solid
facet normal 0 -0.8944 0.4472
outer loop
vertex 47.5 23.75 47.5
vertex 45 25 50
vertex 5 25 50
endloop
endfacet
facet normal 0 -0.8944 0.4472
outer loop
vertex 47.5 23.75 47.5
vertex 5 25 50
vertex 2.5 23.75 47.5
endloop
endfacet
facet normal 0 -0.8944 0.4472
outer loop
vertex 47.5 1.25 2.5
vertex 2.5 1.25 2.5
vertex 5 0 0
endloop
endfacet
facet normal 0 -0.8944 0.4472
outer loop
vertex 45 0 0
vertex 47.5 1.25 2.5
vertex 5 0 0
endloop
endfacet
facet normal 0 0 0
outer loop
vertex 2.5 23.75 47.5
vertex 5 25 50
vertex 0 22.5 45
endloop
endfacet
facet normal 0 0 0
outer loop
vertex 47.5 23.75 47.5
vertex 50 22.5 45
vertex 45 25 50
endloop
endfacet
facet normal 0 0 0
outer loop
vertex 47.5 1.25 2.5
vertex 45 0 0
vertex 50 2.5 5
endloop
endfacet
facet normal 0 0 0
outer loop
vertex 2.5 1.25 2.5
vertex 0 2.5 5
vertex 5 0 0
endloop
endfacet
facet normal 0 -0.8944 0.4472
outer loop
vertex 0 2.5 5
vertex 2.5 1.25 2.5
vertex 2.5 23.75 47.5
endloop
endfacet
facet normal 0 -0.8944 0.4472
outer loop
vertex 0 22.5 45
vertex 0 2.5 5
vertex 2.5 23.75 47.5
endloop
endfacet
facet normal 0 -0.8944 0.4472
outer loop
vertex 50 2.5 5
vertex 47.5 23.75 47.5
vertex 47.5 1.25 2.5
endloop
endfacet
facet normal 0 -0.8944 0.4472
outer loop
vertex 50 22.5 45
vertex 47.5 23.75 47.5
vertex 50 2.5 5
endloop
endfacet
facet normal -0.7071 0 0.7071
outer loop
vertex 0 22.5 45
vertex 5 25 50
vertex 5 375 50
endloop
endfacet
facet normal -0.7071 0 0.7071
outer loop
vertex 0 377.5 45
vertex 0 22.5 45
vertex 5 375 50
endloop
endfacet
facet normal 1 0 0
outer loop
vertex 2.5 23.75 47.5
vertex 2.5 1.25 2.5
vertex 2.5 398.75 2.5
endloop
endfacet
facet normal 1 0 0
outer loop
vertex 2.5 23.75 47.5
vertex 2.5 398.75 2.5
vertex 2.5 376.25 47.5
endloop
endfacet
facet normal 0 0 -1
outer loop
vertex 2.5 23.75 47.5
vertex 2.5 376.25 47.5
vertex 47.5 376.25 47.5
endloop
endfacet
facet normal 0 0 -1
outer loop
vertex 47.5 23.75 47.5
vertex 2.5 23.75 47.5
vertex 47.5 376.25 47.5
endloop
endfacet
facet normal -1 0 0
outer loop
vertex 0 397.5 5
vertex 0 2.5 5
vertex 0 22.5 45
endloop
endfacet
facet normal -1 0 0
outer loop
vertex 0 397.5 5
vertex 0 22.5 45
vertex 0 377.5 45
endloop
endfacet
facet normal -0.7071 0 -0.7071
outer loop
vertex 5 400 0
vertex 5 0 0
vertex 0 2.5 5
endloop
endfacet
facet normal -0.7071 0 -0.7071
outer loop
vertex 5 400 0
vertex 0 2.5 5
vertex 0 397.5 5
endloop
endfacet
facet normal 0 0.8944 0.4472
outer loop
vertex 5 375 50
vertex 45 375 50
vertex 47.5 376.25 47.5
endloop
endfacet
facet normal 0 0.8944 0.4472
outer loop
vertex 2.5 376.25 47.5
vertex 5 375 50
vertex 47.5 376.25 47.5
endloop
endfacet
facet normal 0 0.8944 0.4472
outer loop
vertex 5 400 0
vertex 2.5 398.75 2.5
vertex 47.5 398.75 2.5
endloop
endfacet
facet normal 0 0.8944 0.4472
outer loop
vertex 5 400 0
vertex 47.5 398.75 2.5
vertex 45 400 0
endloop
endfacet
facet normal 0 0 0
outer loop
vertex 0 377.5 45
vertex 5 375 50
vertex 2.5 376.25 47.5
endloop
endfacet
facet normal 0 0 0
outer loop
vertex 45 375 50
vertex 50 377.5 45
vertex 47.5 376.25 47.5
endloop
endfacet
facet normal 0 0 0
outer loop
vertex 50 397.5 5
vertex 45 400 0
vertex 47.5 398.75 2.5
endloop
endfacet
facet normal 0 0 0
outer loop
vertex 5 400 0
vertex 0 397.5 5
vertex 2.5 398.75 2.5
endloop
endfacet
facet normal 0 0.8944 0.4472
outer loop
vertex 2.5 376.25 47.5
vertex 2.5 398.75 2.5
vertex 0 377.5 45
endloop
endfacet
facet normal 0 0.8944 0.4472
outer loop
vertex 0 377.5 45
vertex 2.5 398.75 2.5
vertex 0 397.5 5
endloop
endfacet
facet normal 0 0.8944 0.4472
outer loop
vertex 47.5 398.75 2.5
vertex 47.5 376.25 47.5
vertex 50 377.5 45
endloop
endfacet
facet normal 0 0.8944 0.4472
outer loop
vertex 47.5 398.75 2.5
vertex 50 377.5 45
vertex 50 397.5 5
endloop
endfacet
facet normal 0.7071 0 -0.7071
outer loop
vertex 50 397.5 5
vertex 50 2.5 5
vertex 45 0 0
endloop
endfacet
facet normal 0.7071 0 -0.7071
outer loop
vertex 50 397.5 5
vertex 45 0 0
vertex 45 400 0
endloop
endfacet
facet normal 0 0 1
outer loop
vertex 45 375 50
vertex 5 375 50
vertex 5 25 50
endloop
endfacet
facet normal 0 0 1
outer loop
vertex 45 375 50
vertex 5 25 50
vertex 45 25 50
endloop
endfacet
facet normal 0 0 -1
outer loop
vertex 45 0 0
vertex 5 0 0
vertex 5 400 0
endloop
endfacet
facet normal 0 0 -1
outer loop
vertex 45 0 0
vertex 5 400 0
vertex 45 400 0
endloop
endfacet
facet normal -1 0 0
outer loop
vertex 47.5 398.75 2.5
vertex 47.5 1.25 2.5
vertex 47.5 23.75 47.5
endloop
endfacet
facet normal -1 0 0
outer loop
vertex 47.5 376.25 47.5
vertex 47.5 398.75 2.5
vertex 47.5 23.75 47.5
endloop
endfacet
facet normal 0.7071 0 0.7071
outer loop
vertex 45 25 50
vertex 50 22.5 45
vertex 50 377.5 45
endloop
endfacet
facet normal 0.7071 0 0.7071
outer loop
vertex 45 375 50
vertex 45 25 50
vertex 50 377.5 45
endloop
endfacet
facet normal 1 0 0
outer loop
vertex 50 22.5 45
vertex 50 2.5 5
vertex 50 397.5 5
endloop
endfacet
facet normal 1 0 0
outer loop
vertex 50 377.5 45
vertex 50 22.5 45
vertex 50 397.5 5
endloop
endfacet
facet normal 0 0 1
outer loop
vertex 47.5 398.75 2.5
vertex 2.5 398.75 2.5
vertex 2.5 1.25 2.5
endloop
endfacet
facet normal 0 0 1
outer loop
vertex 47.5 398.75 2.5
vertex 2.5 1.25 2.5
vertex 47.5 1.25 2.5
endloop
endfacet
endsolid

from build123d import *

# Parameters (mm, degrees)
SKETCH1_W           = 50
SKETCH1_H           = 400
BOSS_EXTRUDE2_DEPTH = 50
SKETCH2_W           = 45
SKETCH2_H           = 45
CUT_EXTRUDE1_DEPTH  = 407.201920232
CUT_EXTRUDE2_DEPTH  = 407.201920232
CHAMFER1_SIZE       = 5


with BuildPart() as part:
    # Sketch1 → Boss-Extrude2 (new body)
    with BuildSketch(Plane.XY):
        with Locations((25, 200)):
            Rectangle(SKETCH1_W, SKETCH1_H)
    extrude(amount=BOSS_EXTRUDE2_DEPTH)

    # Sketch2 → Cut-Extrude1 (cut, through all)
    with BuildSketch(Plane.XZ):
        with Locations((25, 25)):
            Rectangle(SKETCH2_W, SKETCH2_H)
    extrude(amount=-CUT_EXTRUDE1_DEPTH, mode=Mode.SUBTRACT)

    # Sketch3 → Cut-Extrude2 (cut, through all)
    with BuildSketch(Plane.ZY):
        Polygon((0, 400), (50, 400), (50, 375), align=None)
        Polygon((0, 0), (50, 0), (50, 25), align=None)
    extrude(amount=-CUT_EXTRUDE2_DEPTH, mode=Mode.SUBTRACT)

    # Chamfer1
    chamfer1_edges = [part.edges().sort_by_distance(p)[0] for p in [
        (0, 200, 50),
        (50, 200, 50),
        (50, 200, 0),
        (0, 200, 0),
    ]]
    chamfer(chamfer1_edges, length=CHAMFER1_SIZE - 0.0001)  # a hair under: the kernel refuses the full size


solid = part.part
